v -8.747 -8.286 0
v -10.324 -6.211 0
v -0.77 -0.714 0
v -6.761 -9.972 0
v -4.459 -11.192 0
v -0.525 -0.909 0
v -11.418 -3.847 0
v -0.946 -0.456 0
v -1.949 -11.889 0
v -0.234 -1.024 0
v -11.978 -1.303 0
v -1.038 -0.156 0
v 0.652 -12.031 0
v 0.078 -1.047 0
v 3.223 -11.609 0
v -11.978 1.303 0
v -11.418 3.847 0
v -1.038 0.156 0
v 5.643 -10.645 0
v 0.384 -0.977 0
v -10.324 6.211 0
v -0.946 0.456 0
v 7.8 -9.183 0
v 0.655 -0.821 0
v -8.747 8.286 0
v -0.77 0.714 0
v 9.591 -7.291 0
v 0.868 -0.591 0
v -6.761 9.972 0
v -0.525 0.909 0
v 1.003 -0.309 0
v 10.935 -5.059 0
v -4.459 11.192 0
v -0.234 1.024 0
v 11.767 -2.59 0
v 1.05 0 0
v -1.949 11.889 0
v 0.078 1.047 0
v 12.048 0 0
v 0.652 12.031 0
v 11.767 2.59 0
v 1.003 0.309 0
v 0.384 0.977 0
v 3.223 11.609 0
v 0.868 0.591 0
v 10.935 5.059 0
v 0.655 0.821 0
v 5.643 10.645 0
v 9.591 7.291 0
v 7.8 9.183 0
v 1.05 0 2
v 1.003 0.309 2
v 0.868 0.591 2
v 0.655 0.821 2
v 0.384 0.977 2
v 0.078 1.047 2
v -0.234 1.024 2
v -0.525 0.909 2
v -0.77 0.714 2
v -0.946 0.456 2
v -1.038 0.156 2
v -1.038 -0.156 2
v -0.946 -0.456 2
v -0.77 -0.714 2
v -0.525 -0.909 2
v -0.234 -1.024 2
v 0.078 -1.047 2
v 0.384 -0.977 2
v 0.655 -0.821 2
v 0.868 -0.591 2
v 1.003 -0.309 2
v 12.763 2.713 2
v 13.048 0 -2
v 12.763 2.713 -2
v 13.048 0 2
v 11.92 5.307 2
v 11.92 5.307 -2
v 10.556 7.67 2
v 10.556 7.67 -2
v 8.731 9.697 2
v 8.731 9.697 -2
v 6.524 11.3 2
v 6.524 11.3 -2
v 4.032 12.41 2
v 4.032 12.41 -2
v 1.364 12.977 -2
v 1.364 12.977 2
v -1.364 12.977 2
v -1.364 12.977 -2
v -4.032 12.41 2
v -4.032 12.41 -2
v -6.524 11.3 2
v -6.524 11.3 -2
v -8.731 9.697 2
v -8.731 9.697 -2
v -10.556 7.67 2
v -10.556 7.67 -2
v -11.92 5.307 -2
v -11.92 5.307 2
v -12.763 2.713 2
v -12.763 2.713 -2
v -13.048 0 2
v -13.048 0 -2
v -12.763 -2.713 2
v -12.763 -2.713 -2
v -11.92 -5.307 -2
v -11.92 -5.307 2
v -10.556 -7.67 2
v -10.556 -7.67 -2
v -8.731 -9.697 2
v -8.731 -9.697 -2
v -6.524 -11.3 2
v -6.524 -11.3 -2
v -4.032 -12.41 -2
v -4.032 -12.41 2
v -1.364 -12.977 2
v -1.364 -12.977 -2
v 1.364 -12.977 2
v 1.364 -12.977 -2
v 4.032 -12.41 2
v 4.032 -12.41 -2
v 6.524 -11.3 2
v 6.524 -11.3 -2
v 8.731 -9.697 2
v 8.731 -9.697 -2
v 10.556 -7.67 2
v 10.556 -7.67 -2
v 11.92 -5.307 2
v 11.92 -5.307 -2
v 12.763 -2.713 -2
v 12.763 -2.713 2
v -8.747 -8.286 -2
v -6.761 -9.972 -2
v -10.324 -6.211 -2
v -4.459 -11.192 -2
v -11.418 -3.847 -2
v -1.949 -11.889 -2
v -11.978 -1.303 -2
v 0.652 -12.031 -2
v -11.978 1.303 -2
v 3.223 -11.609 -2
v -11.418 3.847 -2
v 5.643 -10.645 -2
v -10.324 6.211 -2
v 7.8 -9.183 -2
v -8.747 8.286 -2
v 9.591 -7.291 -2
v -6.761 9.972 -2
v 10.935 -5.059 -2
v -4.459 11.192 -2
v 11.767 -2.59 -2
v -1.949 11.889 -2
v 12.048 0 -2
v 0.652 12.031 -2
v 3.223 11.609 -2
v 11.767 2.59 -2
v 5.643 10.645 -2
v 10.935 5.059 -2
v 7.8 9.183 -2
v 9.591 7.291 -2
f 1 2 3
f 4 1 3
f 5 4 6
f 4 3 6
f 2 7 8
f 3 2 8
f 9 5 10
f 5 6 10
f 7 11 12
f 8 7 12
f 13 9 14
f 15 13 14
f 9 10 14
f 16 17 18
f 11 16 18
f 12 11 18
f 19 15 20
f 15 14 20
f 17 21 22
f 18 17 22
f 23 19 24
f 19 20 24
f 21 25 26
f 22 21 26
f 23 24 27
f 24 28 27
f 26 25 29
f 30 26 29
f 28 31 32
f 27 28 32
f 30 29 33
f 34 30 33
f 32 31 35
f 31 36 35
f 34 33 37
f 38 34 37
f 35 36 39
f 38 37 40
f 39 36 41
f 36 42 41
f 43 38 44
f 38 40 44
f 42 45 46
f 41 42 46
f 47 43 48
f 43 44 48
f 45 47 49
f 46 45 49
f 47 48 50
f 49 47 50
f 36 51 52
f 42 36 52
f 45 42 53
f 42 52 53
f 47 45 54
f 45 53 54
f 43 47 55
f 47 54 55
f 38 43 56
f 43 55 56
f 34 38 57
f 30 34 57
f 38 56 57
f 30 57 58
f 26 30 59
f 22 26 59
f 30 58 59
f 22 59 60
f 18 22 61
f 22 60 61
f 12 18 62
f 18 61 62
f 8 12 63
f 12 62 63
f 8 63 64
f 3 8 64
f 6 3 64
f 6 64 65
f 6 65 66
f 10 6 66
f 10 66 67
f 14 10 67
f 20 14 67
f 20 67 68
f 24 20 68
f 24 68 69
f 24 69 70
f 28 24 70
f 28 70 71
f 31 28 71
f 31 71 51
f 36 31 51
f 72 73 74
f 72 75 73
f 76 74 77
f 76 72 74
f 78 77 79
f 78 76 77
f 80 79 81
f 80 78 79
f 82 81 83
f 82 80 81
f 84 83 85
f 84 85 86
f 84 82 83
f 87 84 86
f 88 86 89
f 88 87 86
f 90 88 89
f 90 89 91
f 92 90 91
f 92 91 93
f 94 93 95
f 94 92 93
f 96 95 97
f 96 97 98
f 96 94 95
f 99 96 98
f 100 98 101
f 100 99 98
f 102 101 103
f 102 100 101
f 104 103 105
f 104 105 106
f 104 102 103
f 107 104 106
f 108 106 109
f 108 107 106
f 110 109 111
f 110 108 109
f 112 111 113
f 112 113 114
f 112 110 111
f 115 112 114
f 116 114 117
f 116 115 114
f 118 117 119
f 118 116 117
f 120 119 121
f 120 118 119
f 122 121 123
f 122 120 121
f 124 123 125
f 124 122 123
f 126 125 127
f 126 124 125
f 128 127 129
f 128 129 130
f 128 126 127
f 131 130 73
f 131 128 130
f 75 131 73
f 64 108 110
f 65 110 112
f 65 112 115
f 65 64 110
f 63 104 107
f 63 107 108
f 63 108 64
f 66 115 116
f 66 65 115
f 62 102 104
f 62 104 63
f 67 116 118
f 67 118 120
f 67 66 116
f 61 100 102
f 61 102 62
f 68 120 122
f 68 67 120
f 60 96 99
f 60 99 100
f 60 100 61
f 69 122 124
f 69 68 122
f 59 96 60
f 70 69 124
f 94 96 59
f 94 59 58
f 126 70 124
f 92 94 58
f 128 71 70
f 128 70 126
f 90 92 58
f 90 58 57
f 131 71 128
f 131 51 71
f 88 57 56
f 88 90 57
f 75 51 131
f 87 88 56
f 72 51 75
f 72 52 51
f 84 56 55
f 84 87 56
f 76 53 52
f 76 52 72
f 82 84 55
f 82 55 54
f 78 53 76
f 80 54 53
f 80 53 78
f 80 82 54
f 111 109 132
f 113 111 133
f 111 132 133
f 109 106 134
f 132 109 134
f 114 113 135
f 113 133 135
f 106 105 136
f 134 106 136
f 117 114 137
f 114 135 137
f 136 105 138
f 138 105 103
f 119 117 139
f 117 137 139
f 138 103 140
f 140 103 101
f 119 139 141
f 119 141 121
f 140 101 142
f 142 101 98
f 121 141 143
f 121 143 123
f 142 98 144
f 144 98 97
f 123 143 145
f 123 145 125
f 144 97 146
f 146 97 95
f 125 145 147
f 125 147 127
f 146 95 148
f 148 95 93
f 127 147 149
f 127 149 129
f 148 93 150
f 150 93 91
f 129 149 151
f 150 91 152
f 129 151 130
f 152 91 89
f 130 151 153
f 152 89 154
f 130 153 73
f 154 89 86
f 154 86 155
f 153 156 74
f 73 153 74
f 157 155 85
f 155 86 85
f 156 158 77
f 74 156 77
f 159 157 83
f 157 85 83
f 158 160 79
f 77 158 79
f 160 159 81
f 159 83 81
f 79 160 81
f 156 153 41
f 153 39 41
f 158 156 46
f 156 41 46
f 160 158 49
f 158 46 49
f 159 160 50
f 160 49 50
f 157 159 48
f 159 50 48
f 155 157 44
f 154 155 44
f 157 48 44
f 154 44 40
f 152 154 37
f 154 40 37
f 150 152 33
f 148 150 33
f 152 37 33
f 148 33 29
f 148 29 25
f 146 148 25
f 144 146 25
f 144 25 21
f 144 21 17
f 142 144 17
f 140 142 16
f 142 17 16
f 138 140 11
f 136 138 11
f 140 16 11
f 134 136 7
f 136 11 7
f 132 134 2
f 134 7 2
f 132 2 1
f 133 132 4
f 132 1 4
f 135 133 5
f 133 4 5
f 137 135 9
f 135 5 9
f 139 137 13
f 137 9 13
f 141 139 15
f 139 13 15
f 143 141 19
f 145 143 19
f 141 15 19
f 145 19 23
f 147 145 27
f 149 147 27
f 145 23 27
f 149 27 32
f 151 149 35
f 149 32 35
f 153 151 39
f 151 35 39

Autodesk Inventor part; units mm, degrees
ref_plane "YZ Plane" through (0, 0, 0) normal (1, 0, 0) x (0, 1, 0)
ref_plane "XZ Plane" through (0, 0, 0) normal (0, 1, 0) x (-1, 0, 0)
ref_plane "XY Plane" through (0, 0, 0) normal (0, 0, 1) x (1, 0, 0)
sketch "Sketch1" plane through (0, 0, 0) normal (0, 0, 1) x (1, 0, 0)
  circle A0 centre (0, 0) radius 13.0482
  spline S0 degree 3 poles (1.4215, 11.0572) (1.4473, 10.9809) (1.4859, 10.8664) (1.5292, 10.7112) (1.5586, 10.5939) (1.5843, 10.4759) (1.6059, 10.357) (1.6236, 10.2374) (1.631, 10.1572) (1.6346, 10.117) knots -0.096663 -0.096663 -0.096663 -0.096663 -0.072499 -0.060415 -0.048332 -0.036249 -0.024166 -0.012083 0 0 0 0 projected
  arc A1 (1.9905, 10.0531) -> (1.6346, 10.117) centre (0, 0) ccw projected
  spline S1 degree 3 poles (1.9905, 10.0531) (2.0079, 10.0894) (2.0426, 10.1621) (2.1009, 10.268) (2.1626, 10.3719) (2.2278, 10.4737) (2.2962, 10.5733) (2.3908, 10.7038) (2.4669, 10.7977) (2.5176, 10.8602) knots -0.096663 -0.096663 -0.096663 -0.096663 -0.084581 -0.072498 -0.060415 -0.048331 -0.036248 -0.024165 0 0 0 0 projected
  arc A2 (2.7193, 10.8115) -> (2.5176, 10.8602) centre (0, 0) ccw projected
  spline S2 degree 3 poles (2.7193, 10.8115) (2.7359, 10.7327) (2.7607, 10.6144) (2.7853, 10.4551) (2.8006, 10.3353) (2.8122, 10.215) (2.8196, 10.0943) (2.8231, 9.9735) (2.8208, 9.893) (2.8197, 9.8527) knots -0.096663 -0.096663 -0.096663 -0.096663 -0.072499 -0.060415 -0.048332 -0.036249 -0.024166 -0.012083 0 0 0 0 projected
  arc A3 (3.1655, 9.7471) -> (2.8197, 9.8527) centre (0, 0) ccw projected
  spline S3 degree 3 poles (3.1655, 9.7471) (3.1871, 9.7811) (3.2302, 9.8492) (3.3006, 9.9475) (3.3741, 10.0433) (3.4509, 10.1367) (3.5306, 10.2275) (3.64, 10.3459) (3.7266, 10.4301) (3.7844, 10.4863) knots -0.096663 -0.096663 -0.096663 -0.096663 -0.084581 -0.072498 -0.060415 -0.048331 -0.036248 -0.024165 0 0 0 0 projected
  arc A4 (3.9789, 10.414) -> (3.7844, 10.4863) centre (0, 0) ccw projected
  spline S4 degree 3 poles (3.9789, 10.414) (3.986, 10.3337) (3.9967, 10.2134) (4.0023, 10.0523) (4.0033, 9.9315) (4.0006, 9.8106) (3.9937, 9.69) (3.9828, 9.5696) (3.9711, 9.4899) (3.9652, 9.45) knots -0.096663 -0.096663 -0.096663 -0.096663 -0.072499 -0.060415 -0.048332 -0.036249 -0.024166 -0.012083 0 0 0 0 projected
  arc A5 (4.2961, 9.3043) -> (3.9652, 9.45) centre (0, 0) ccw projected
  spline S5 degree 3 poles (4.2961, 9.3043) (4.3215, 9.3355) (4.3724, 9.398) (4.4539, 9.4873) (4.5383, 9.5738) (4.6256, 9.6574) (4.7154, 9.7382) (4.838, 9.8428) (4.9341, 9.9161) (4.9981, 9.9651) knots -0.096663 -0.096663 -0.096663 -0.096663 -0.084581 -0.072498 -0.060415 -0.048331 -0.036248 -0.024165 0 0 0 0 projected
  arc A6 (5.1827, 9.8703) -> (4.9981, 9.9651) centre (0, 0) ccw projected
  spline S6 degree 3 poles (5.1827, 9.8703) (5.1803, 9.7898) (5.1766, 9.669) (5.1631, 9.5084) (5.1498, 9.3883) (5.1328, 9.2686) (5.1117, 9.1496) (5.0867, 9.0314) (5.0656, 8.9536) (5.0551, 8.9147) knots -0.096663 -0.096663 -0.096663 -0.096663 -0.072499 -0.060415 -0.048332 -0.036249 -0.024166 -0.012083 0 0 0 0 projected
  arc A7 (5.3664, 8.7309) -> (5.0551, 8.9147) centre (0, 0) ccw projected
  spline S7 degree 3 poles (5.3664, 8.7309) (5.3954, 8.7589) (5.4533, 8.8149) (5.5447, 8.8939) (5.6388, 8.9698) (5.7353, 9.0425) (5.8341, 9.1121) (5.9682, 9.2015) (6.0723, 9.263) (6.1416, 9.304) knots -0.096663 -0.096663 -0.096663 -0.096663 -0.084581 -0.072498 -0.060415 -0.048331 -0.036248 -0.024165 0 0 0 0 projected
  arc A8 (6.3137, 9.1881) -> (6.1416, 9.304) centre (0, 0) ccw projected
  spline S8 degree 3 poles (6.3137, 9.1881) (6.3018, 9.1084) (6.2839, 8.9889) (6.2515, 8.831) (6.2241, 8.7133) (6.193, 8.5965) (6.158, 8.4808) (6.1192, 8.3664) (6.089, 8.2916) (6.074, 8.2543) knots -0.096663 -0.096663 -0.096663 -0.096663 -0.072499 -0.060415 -0.048332 -0.036249 -0.024166 -0.012083 0 0 0 0 projected
  arc A9 (6.3614, 8.0349) -> (6.074, 8.2543) centre (0, 0) ccw projected
  spline S9 degree 3 poles (6.3614, 8.0349) (6.3934, 8.0593) (6.4576, 8.108) (6.5577, 8.1757) (6.6601, 8.24) (6.7646, 8.3007) (6.8709, 8.3581) (7.0146, 8.431) (7.1252, 8.4798) (7.1989, 8.5123) knots -0.096663 -0.096663 -0.096663 -0.096663 -0.084581 -0.072498 -0.060415 -0.048331 -0.036248 -0.024165 0 0 0 0 projected
  arc A10 (7.3561, 8.3768) -> (7.1989, 8.5123) centre (0, 0) ccw projected
  spline S10 degree 3 poles (7.3561, 8.3768) (7.3348, 8.2991) (7.3029, 8.1825) (7.2521, 8.0296) (7.2109, 7.916) (7.1663, 7.8037) (7.1179, 7.693) (7.0657, 7.5839) (7.027, 7.5133) (7.0076, 7.478) knots -0.096663 -0.096663 -0.096663 -0.096663 -0.072499 -0.060415 -0.048332 -0.036249 -0.024166 -0.012083 0 0 0 0 projected
  arc A11 (7.267, 7.2261) -> (7.0076, 7.478) centre (0, 0) ccw projected
  spline S11 degree 3 poles (7.267, 7.2261) (7.3017, 7.2465) (7.3712, 7.2874) (7.4787, 7.3427) (7.5879, 7.3944) (7.6988, 7.4424) (7.8112, 7.4868) (7.9625, 7.5422) (8.0781, 7.5775) (8.1552, 7.6011) knots -0.096663 -0.096663 -0.096663 -0.096663 -0.084581 -0.072498 -0.060415 -0.048331 -0.036248 -0.024165 0 0 0 0 projected
  arc A12 (8.2952, 7.448) -> (8.1552, 7.6011) centre (0, 0) ccw projected
  spline S12 degree 3 poles (8.2952, 7.448) (8.2649, 7.3734) (8.2194, 7.2614) (8.1509, 7.1155) (8.0966, 7.0076) (8.039, 6.9013) (7.9778, 6.7971) (7.9131, 6.695) (7.8663, 6.6294) (7.8429, 6.5967) knots -0.096663 -0.096663 -0.096663 -0.096663 -0.072499 -0.060415 -0.048332 -0.036249 -0.024166 -0.012083 0 0 0 0 projected
  arc A13 (8.0707, 6.3159) -> (7.8429, 6.5967) centre (0, 0) ccw projected
  spline S13 degree 3 poles (8.0707, 6.3159) (8.1076, 6.3321) (8.1814, 6.3644) (8.2946, 6.4066) (8.4092, 6.4451) (8.525, 6.4796) (8.6419, 6.5104) (8.7987, 6.5475) (8.9176, 6.5689) (8.9969, 6.5832) knots -0.096663 -0.096663 -0.096663 -0.096663 -0.084581 -0.072498 -0.060415 -0.048331 -0.036248 -0.024165 0 0 0 0 projected
  arc A14 (9.1179, 6.4146) -> (8.9969, 6.5832) centre (0, 0) ccw projected
  spline S14 degree 3 poles (9.1179, 6.4146) (9.079, 6.3441) (9.0206, 6.2383) (8.9352, 6.1016) (8.8686, 6.0008) (8.7988, 5.9021) (8.7257, 5.8059) (8.6494, 5.7121) (8.5952, 5.6525) (8.568, 5.6228) knots -0.096663 -0.096663 -0.096663 -0.096663 -0.072499 -0.060415 -0.048332 -0.036249 -0.024166 -0.012083 0 0 0 0 projected
  arc A15 (8.761, 5.317) -> (8.568, 5.6228) centre (0, 0) ccw projected
  spline S15 degree 3 poles (8.761, 5.317) (8.7996, 5.3287) (8.8767, 5.3521) (8.9941, 5.3806) (9.1125, 5.4052) (9.2316, 5.4258) (9.3512, 5.4426) (9.5113, 5.4609) (9.632, 5.4681) (9.7124, 5.4729) knots -0.096663 -0.096663 -0.096663 -0.096663 -0.084581 -0.072498 -0.060415 -0.048331 -0.036248 -0.024165 0 0 0 0 projected
  arc A16 (9.8126, 5.2912) -> (9.7124, 5.4729) centre (0, 0) ccw projected
  spline S16 degree 3 poles (9.8126, 5.2912) (9.7656, 5.2258) (9.6951, 5.1276) (9.5942, 5.002) (9.516, 4.9097) (9.4351, 4.82) (9.3511, 4.7331) (9.2643, 4.649) (9.2034, 4.5963) (9.1729, 4.5699) knots -0.096663 -0.096663 -0.096663 -0.096663 -0.072499 -0.060415 -0.048332 -0.036249 -0.024166 -0.012083 0 0 0 0 projected
  arc A17 (9.3284, 4.2435) -> (9.1729, 4.5699) centre (0, 0) ccw projected
  spline S17 degree 3 poles (9.3284, 4.2435) (9.3681, 4.2506) (9.4474, 4.2647) (9.5674, 4.2791) (9.6878, 4.2896) (9.8085, 4.2959) (9.9293, 4.2984) (10.0904, 4.2976) (10.2111, 4.2905) (10.2915, 4.2858) knots -0.096663 -0.096663 -0.096663 -0.096663 -0.084581 -0.072498 -0.060415 -0.048331 -0.036248 -0.024165 0 0 0 0 projected
  arc A18 (10.3695, 4.0935) -> (10.2915, 4.2858) centre (0, 0) ccw projected
  spline S18 degree 3 poles (10.3695, 4.0935) (10.3151, 4.0341) (10.2335, 3.9449) (10.1184, 3.8321) (10.0299, 3.7498) (9.939, 3.6703) (9.8453, 3.5939) (9.7491, 3.5206) (9.6824, 3.4755) (9.649, 3.4529) knots -0.096663 -0.096663 -0.096663 -0.096663 -0.072499 -0.060415 -0.048332 -0.036249 -0.024166 -0.012083 0 0 0 0 projected
  arc A19 (9.7648, 3.1104) -> (9.649, 3.4529) centre (0, 0) ccw projected
  spline S19 degree 3 poles (9.7648, 3.1104) (9.805, 3.1127) (9.8855, 3.1174) (10.0063, 3.1175) (10.1271, 3.1136) (10.2477, 3.1056) (10.368, 3.0939) (10.5279, 3.074) (10.6469, 3.0527) (10.7262, 3.0385) knots -0.096663 -0.096663 -0.096663 -0.096663 -0.084581 -0.072498 -0.060415 -0.048331 -0.036248 -0.024165 0 0 0 0 projected
  arc A20 (10.7809, 2.8383) -> (10.7262, 3.0385) centre (0, 0) ccw projected
  spline S20 degree 3 poles (10.7809, 2.8383) (10.7198, 2.7858) (10.6282, 2.7069) (10.5006, 2.6085) (10.403, 2.5372) (10.3033, 2.469) (10.2013, 2.4042) (10.0971, 2.3429) (10.0255, 2.306) (9.9897, 2.2875) knots -0.096663 -0.096663 -0.096663 -0.096663 -0.072499 -0.060415 -0.048332 -0.036249 -0.024166 -0.012083 0 0 0 0 projected
  arc A21 (10.0642, 1.9337) -> (9.9897, 2.2875) centre (0, 0) ccw projected
  spline S21 degree 3 poles (10.0642, 1.9337) (10.1044, 1.9312) (10.1848, 1.9263) (10.3048, 1.9121) (10.4243, 1.894) (10.5431, 1.8718) (10.6611, 1.8459) (10.8176, 1.8073) (10.9332, 1.772) (11.0103, 1.7485) knots -0.096663 -0.096663 -0.096663 -0.096663 -0.084581 -0.072498 -0.060415 -0.048331 -0.036248 -0.024165 0 0 0 0 projected
  arc A22 (11.0409, 1.5433) -> (11.0103, 1.7485) centre (0, 0) ccw projected
  spline S22 degree 3 poles (11.0409, 1.5433) (10.9741, 1.4983) (10.8738, 1.4309) (10.7354, 1.3482) (10.6301, 1.289) (10.523, 1.2331) (10.414, 1.1808) (10.3033, 1.1322) (10.2279, 1.104) (10.1901, 1.0899) knots -0.096663 -0.096663 -0.096663 -0.096663 -0.072499 -0.060415 -0.048332 -0.036249 -0.024166 -0.012083 0 0 0 0 projected
  arc A23 (10.2222, 0.7298) -> (10.1901, 1.0899) centre (0, 0) ccw projected
  spline S23 degree 3 poles (10.2222, 0.7298) (10.2619, 0.7226) (10.3411, 0.7082) (10.4587, 0.6799) (10.5752, 0.6478) (10.6905, 0.6117) (10.8046, 0.572) (10.9554, 0.5152) (11.066, 0.4665) (11.1398, 0.434) knots -0.096663 -0.096663 -0.096663 -0.096663 -0.084581 -0.072498 -0.060415 -0.048331 -0.036248 -0.024165 0 0 0 0 projected
  arc A24 (11.1459, 0.2266) -> (11.1398, 0.434) centre (0, 0) ccw projected
  spline S24 degree 3 poles (11.1459, 0.2266) (11.0742, 0.1899) (10.9667, 0.1348) (10.8196, 0.069) (10.708, 0.0227) (10.595, -0.0202) (10.4806, -0.0592) (10.3649, -0.0943) (10.2866, -0.1134) (10.2475, -0.1229) knots -0.096663 -0.096663 -0.096663 -0.096663 -0.072499 -0.060415 -0.048332 -0.036249 -0.024166 -0.012083 0 0 0 0 projected
  arc A25 (10.2368, -0.4843) -> (10.2475, -0.1229) centre (0, 0) ccw projected
  spline S25 degree 3 poles (10.2368, -0.4843) (10.2753, -0.4962) (10.3523, -0.5199) (10.4657, -0.5618) (10.5775, -0.6075) (10.6878, -0.657) (10.7965, -0.7099) (10.9394, -0.7842) (11.0435, -0.8456) (11.1129, -0.8865) knots -0.096663 -0.096663 -0.096663 -0.096663 -0.084581 -0.072498 -0.060415 -0.048331 -0.036248 -0.024165 0 0 0 0 projected
  arc A26 (11.0945, -1.0932) -> (11.1129, -0.8865) centre (0, 0) ccw projected
  spline S26 degree 3 poles (11.0945, -1.0932) (11.019, -1.1212) (10.9057, -1.1633) (10.7518, -1.2111) (10.6355, -1.2439) (10.5182, -1.2731) (10.4, -1.2983) (10.281, -1.3196) (10.201, -1.3292) (10.161, -1.3341) knots -0.096663 -0.096663 -0.096663 -0.096663 -0.072499 -0.060415 -0.048332 -0.036249 -0.024166 -0.012083 0 0 0 0 projected
  arc A27 (10.1077, -1.6917) -> (10.161, -1.3341) centre (0, 0) ccw projected
  spline S27 degree 3 poles (10.1077, -1.6917) (10.1445, -1.708) (10.2182, -1.7406) (10.3258, -1.7957) (10.4315, -1.8543) (10.5351, -1.9165) (10.6367, -1.9818) (10.7699, -2.0725) (10.866, -2.1458) (10.9301, -2.1947) knots -0.096663 -0.096663 -0.096663 -0.096663 -0.084581 -0.072498 -0.060415 -0.048331 -0.036248 -0.024165 0 0 0 0 projected
  arc A28 (10.8873, -2.3977) -> (10.9301, -2.1947) centre (0, 0) ccw projected
  spline S28 degree 3 poles (10.8873, -2.3977) (10.809, -2.4166) (10.6915, -2.4449) (10.5331, -2.4742) (10.4137, -2.4931) (10.2938, -2.5082) (10.1735, -2.5192) (10.0528, -2.5263) (9.9722, -2.5264) (9.9319, -2.5265) knots -0.096663 -0.096663 -0.096663 -0.096663 -0.072499 -0.060415 -0.048332 -0.036249 -0.024166 -0.012083 0 0 0 0 projected
  arc A29 (9.8366, -2.8753) -> (9.9319, -2.5265) centre (0, 0) ccw projected
  spline S29 degree 3 poles (9.8366, -2.8753) (9.8713, -2.8958) (9.9406, -2.9369) (10.0409, -3.0043) (10.1389, -3.075) (10.2345, -3.149) (10.3277, -3.226) (10.4492, -3.3318) (10.536, -3.4159) (10.5938, -3.472) knots -0.096663 -0.096663 -0.096663 -0.096663 -0.084581 -0.072498 -0.060415 -0.048331 -0.036248 -0.024165 0 0 0 0 projected
  arc A30 (10.5273, -3.6686) -> (10.5938, -3.472) centre (0, 0) ccw projected
  spline S30 degree 3 poles (10.5273, -3.6686) (10.4473, -3.6781) (10.3273, -3.6923) (10.1665, -3.7027) (10.0457, -3.7073) (9.9249, -3.7081) (9.8041, -3.7048) (9.6834, -3.6975) (9.6034, -3.6881) (9.5634, -3.6834) knots -0.096663 -0.096663 -0.096663 -0.096663 -0.072499 -0.060415 -0.048332 -0.036249 -0.024166 -0.012083 0 0 0 0 projected
  arc A31 (9.4275, -4.0185) -> (9.5634, -3.6834) centre (0, 0) ccw projected
  spline S31 degree 3 poles (9.4275, -4.0185) (9.4595, -4.043) (9.5234, -4.092) (9.6151, -4.1708) (9.7041, -4.2526) (9.7902, -4.3374) (9.8736, -4.4248) (9.9818, -4.5442) (10.058, -4.6381) (10.1088, -4.7006) knots -0.096663 -0.096663 -0.096663 -0.096663 -0.084581 -0.072498 -0.060415 -0.048331 -0.036248 -0.024165 0 0 0 0 projected
  arc A32 (10.0196, -4.8879) -> (10.1088, -4.7006) centre (0, 0) ccw projected
  spline S32 degree 3 poles (10.0196, -4.8879) (9.939, -4.8879) (9.8181, -4.8878) (9.6572, -4.8791) (9.5368, -4.8694) (9.4167, -4.8559) (9.2971, -4.8384) (9.1781, -4.8168) (9.0998, -4.7981) (9.0606, -4.7887) knots -0.096663 -0.096663 -0.096663 -0.096663 -0.072499 -0.060415 -0.048332 -0.036249 -0.024166 -0.012083 0 0 0 0 projected
  arc A33 (8.8861, -5.1053) -> (9.0606, -4.7887) centre (0, 0) ccw projected
  spline S33 degree 3 poles (8.8861, -5.1053) (8.9149, -5.1334) (8.9726, -5.1897) (9.0543, -5.2788) (9.133, -5.3705) (9.2085, -5.4649) (9.281, -5.5615) (9.3743, -5.6929) (9.4388, -5.7951) (9.4819, -5.8632) knots -0.096663 -0.096663 -0.096663 -0.096663 -0.084581 -0.072498 -0.060415 -0.048331 -0.036248 -0.024165 0 0 0 0 projected
  arc A34 (9.3711, -6.0387) -> (9.4819, -5.8632) centre (0, 0) ccw projected
  spline S34 degree 3 poles (9.3711, -6.0387) (9.2911, -6.0291) (9.1711, -6.0147) (9.0124, -5.987) (8.8939, -5.9631) (8.7762, -5.9356) (8.6596, -5.904) (8.544, -5.8686) (8.4684, -5.8407) (8.4307, -5.8267) knots -0.096663 -0.096663 -0.096663 -0.096663 -0.072499 -0.060415 -0.048332 -0.036249 -0.024166 -0.012083 0 0 0 0 projected
  arc A35 (8.2199, -6.1205) -> (8.4307, -5.8267) centre (0, 0) ccw projected
  spline S35 degree 3 poles (8.2199, -6.1205) (8.2452, -6.1518) (8.2958, -6.2144) (8.3664, -6.3126) (8.4337, -6.413) (8.4975, -6.5156) (8.5581, -6.6202) (8.6352, -6.7617) (8.6872, -6.8708) (8.7219, -6.9435) knots -0.096663 -0.096663 -0.096663 -0.096663 -0.084581 -0.072498 -0.060415 -0.048331 -0.036248 -0.024165 0 0 0 0 projected
  arc A36 (8.5911, -7.1046) -> (8.7219, -6.9435) centre (0, 0) ccw projected
  spline S36 degree 3 poles (8.5911, -7.1046) (8.5128, -7.0857) (8.3954, -7.0572) (8.241, -7.0109) (8.1262, -6.9732) (8.0126, -6.9319) (7.9005, -6.8868) (7.79, -6.8379) (7.7182, -6.8013) (7.6823, -6.7829) knots -0.096663 -0.096663 -0.096663 -0.096663 -0.072499 -0.060415 -0.048332 -0.036249 -0.024166 -0.012083 0 0 0 0 projected
  arc A37 (7.4383, -7.0497) -> (7.6823, -6.7829) centre (0, 0) ccw projected
  spline S37 degree 3 poles (7.4383, -7.0497) (7.4597, -7.0838) (7.5026, -7.152) (7.5611, -7.2578) (7.616, -7.3654) (7.6672, -7.4749) (7.715, -7.5859) (7.7748, -7.7355) (7.8136, -7.85) (7.8394, -7.9263) knots -0.096663 -0.096663 -0.096663 -0.096663 -0.084581 -0.072498 -0.060415 -0.048331 -0.036248 -0.024165 0 0 0 0 projected
  arc A38 (7.6905, -8.0709) -> (7.8394, -7.9263) centre (0, 0) ccw projected
  spline S38 degree 3 poles (7.6905, -8.0709) (7.615, -8.0428) (7.5018, -8.0006) (7.354, -7.9364) (7.2444, -7.8854) (7.1365, -7.8309) (7.0306, -7.7728) (6.9265, -7.7113) (6.8596, -7.6664) (6.8262, -7.6439) knots -0.096663 -0.096663 -0.096663 -0.096663 -0.072499 -0.060415 -0.048332 -0.036249 -0.024166 -0.012083 0 0 0 0 projected
  arc A39 (6.5523, -7.88) -> (6.8262, -7.6439) centre (0, 0) ccw projected
  spline S39 degree 3 poles (6.5523, -7.88) (6.5696, -7.9164) (6.6041, -7.9892) (6.6496, -8.1011) (6.6914, -8.2145) (6.7293, -8.3293) (6.7637, -8.4451) (6.8053, -8.6008) (6.8303, -8.7191) (6.8469, -8.7979) knots -0.096663 -0.096663 -0.096663 -0.096663 -0.084581 -0.072498 -0.060415 -0.048331 -0.036248 -0.024165 0 0 0 0 projected
  arc A40 (6.682, -8.9238) -> (6.8469, -8.7979) centre (0, 0) ccw projected
  spline S40 degree 3 poles (6.682, -8.9238) (6.6103, -8.887) (6.5028, -8.8317) (6.3637, -8.7505) (6.261, -8.6868) (6.1602, -8.62) (6.0619, -8.5498) (5.9659, -8.4764) (5.9048, -8.4239) (5.8742, -8.3976) knots -0.096663 -0.096663 -0.096663 -0.096663 -0.072499 -0.060415 -0.048332 -0.036249 -0.024166 -0.012083 0 0 0 0 projected
  arc A41 (5.5743, -8.5996) -> (5.8742, -8.3976) centre (0, 0) ccw projected
  spline S41 degree 3 poles (5.5743, -8.5996) (5.5871, -8.6378) (5.6128, -8.7142) (5.6448, -8.8307) (5.6729, -8.9483) (5.697, -9.0667) (5.7173, -9.1858) (5.7403, -9.3453) (5.7511, -9.4657) (5.7583, -9.5459) knots -0.096663 -0.096663 -0.096663 -0.096663 -0.084581 -0.072498 -0.060415 -0.048331 -0.036248 -0.024165 0 0 0 0 projected
  arc A42 (5.5797, -9.6515) -> (5.7583, -9.5459) centre (0, 0) ccw projected
  spline S42 degree 3 poles (5.5797, -9.6515) (5.5128, -9.6064) (5.4126, -9.5389) (5.2841, -9.4417) (5.1896, -9.3664) (5.0975, -9.2881) (5.0081, -9.2068) (4.9215, -9.1225) (4.867, -9.0631) (4.8397, -9.0335) knots -0.096663 -0.096663 -0.096663 -0.096663 -0.072499 -0.060415 -0.048332 -0.036249 -0.024166 -0.012083 0 0 0 0 projected
  arc A43 (4.5181, -9.1985) -> (4.8397, -9.0335) centre (0, 0) ccw projected
  spline S43 degree 3 poles (4.5181, -9.1985) (4.5263, -9.238) (4.5428, -9.3169) (4.5607, -9.4364) (4.5747, -9.5564) (4.5846, -9.6769) (4.5908, -9.7976) (4.5947, -9.9587) (4.5912, -10.0795) (4.5889, -10.16) knots -0.096663 -0.096663 -0.096663 -0.096663 -0.084581 -0.072498 -0.060415 -0.048331 -0.036248 -0.024165 0 0 0 0 projected
  arc A44 (4.399, -10.2436) -> (4.5889, -10.16) centre (0, 0) ccw projected
  spline S44 degree 3 poles (4.399, -10.2436) (4.338, -10.191) (4.2465, -10.1121) (4.1303, -10.0004) (4.0454, -9.9144) (3.9632, -9.8258) (3.8841, -9.7345) (3.808, -9.6405) (3.7609, -9.5751) (3.7374, -9.5425) knots -0.096663 -0.096663 -0.096663 -0.096663 -0.072499 -0.060415 -0.048332 -0.036249 -0.024166 -0.012083 0 0 0 0 projected
  arc A45 (3.3984, -9.6684) -> (3.7374, -9.5425) centre (0, 0) ccw projected
  spline S45 degree 3 poles (3.3984, -9.6684) (3.4019, -9.7085) (3.4089, -9.7887) (3.4127, -9.9096) (3.4124, -10.0304) (3.4079, -10.1512) (3.3998, -10.2718) (3.3846, -10.4322) (3.3669, -10.5517) (3.355, -10.6314) knots -0.096663 -0.096663 -0.096663 -0.096663 -0.084581 -0.072498 -0.060415 -0.048331 -0.036248 -0.024165 0 0 0 0 projected
  arc A46 (3.1566, -10.692) -> (3.355, -10.6314) centre (0, 0) ccw projected
  spline S46 degree 3 poles (3.1566, -10.692) (3.1022, -10.6326) (3.0207, -10.5433) (2.9185, -10.4187) (2.8444, -10.3233) (2.7732, -10.2256) (2.7055, -10.1255) (2.6411, -10.0232) (2.602, -9.9528) (2.5825, -9.9175) knots -0.096663 -0.096663 -0.096663 -0.096663 -0.072499 -0.060415 -0.048332 -0.036249 -0.024166 -0.012083 0 0 0 0 projected
  arc A47 (2.2311, -10.0024) -> (2.5825, -9.9175) centre (0, 0) ccw projected
  spline S47 degree 3 poles (2.2311, -10.0024) (2.2298, -10.0427) (2.2273, -10.1232) (2.2167, -10.2436) (2.2021, -10.3636) (2.1834, -10.483) (2.161, -10.6018) (2.127, -10.7593) (2.0952, -10.8759) (2.074, -10.9536) knots -0.096663 -0.096663 -0.096663 -0.096663 -0.084581 -0.072498 -0.060415 -0.048331 -0.036248 -0.024165 0 0 0 0 projected
  arc A48 (1.8698, -10.9903) -> (2.074, -10.9536) centre (0, 0) ccw projected
  spline S48 degree 3 poles (1.8698, -10.9903) (1.8229, -10.9248) (1.7525, -10.8266) (1.6658, -10.6908) (1.6034, -10.5872) (1.5443, -10.4818) (1.4889, -10.3744) (1.437, -10.2652) (1.4066, -10.1906) (1.3914, -10.1533) knots -0.096663 -0.096663 -0.096663 -0.096663 -0.072499 -0.060415 -0.048332 -0.036249 -0.024166 -0.012083 0 0 0 0 projected
  arc A49 (1.0324, -10.1961) -> (1.3914, -10.1533) centre (0, 0) ccw projected
  spline S49 degree 3 poles (1.0324, -10.1961) (1.0264, -10.2359) (1.0143, -10.3156) (0.9896, -10.4339) (0.9609, -10.5513) (0.9282, -10.6677) (0.892, -10.7829) (0.8396, -10.9353) (0.7942, -11.0474) (0.764, -11.122) knots -0.096663 -0.096663 -0.096663 -0.096663 -0.084581 -0.072498 -0.060415 -0.048331 -0.036248 -0.024165 0 0 0 0 projected
  arc A50 (0.5568, -11.1343) -> (0.764, -11.122) centre (0, 0) ccw projected
  spline S50 degree 3 poles (0.5568, -11.1343) (0.518, -11.0637) (0.4597, -10.9579) (0.3896, -10.8128) (0.34, -10.7026) (0.2938, -10.5909) (0.2514, -10.4777) (0.2129, -10.3632) (0.1915, -10.2855) (0.1808, -10.2466) knots -0.096663 -0.096663 -0.096663 -0.096663 -0.072499 -0.060415 -0.048332 -0.036249 -0.024166 -0.012083 0 0 0 0 projected
  arc A51 (-0.1808, -10.2466) -> (0.1808, -10.2466) centre (0, 0) ccw projected
  spline S51 degree 3 poles (-0.1808, -10.2466) (-0.1915, -10.2855) (-0.2129, -10.3632) (-0.2514, -10.4777) (-0.2938, -10.5909) (-0.34, -10.7026) (-0.3896, -10.8128) (-0.4597, -10.9579) (-0.518, -11.0637) (-0.5568, -11.1343) knots -0.096663 -0.096663 -0.096663 -0.096663 -0.084581 -0.072498 -0.060415 -0.048331 -0.036248 -0.024165 0 0 0 0 projected
  arc A52 (-0.764, -11.122) -> (-0.5568, -11.1343) centre (0, 0) ccw projected
  spline S52 degree 3 poles (-0.764, -11.122) (-0.7942, -11.0474) (-0.8396, -10.9353) (-0.892, -10.7829) (-0.9282, -10.6677) (-0.9609, -10.5513) (-0.9896, -10.4339) (-1.0143, -10.3156) (-1.0264, -10.2359) (-1.0324, -10.1961) knots -0.096663 -0.096663 -0.096663 -0.096663 -0.072499 -0.060415 -0.048332 -0.036249 -0.024166 -0.012083 0 0 0 0 projected
  arc A53 (-1.3914, -10.1533) -> (-1.0324, -10.1961) centre (0, 0) ccw projected
  spline S53 degree 3 poles (-1.3914, -10.1533) (-1.4066, -10.1906) (-1.437, -10.2652) (-1.4889, -10.3744) (-1.5443, -10.4818) (-1.6034, -10.5872) (-1.6658, -10.6908) (-1.7525, -10.8266) (-1.8229, -10.9248) (-1.8698, -10.9903) knots -0.096663 -0.096663 -0.096663 -0.096663 -0.084581 -0.072498 -0.060415 -0.048331 -0.036248 -0.024165 0 0 0 0 projected
  arc A54 (-2.074, -10.9536) -> (-1.8698, -10.9903) centre (0, 0) ccw projected
  spline S54 degree 3 poles (-2.074, -10.9536) (-2.0952, -10.8759) (-2.127, -10.7593) (-2.161, -10.6018) (-2.1834, -10.483) (-2.2021, -10.3636) (-2.2167, -10.2436) (-2.2273, -10.1232) (-2.2298, -10.0427) (-2.2311, -10.0024) knots -0.096663 -0.096663 -0.096663 -0.096663 -0.072499 -0.060415 -0.048332 -0.036249 -0.024166 -0.012083 0 0 0 0 projected
  arc A55 (-2.5825, -9.9175) -> (-2.2311, -10.0024) centre (0, 0) ccw projected
  spline S55 degree 3 poles (-2.5825, -9.9175) (-2.602, -9.9528) (-2.6411, -10.0232) (-2.7055, -10.1255) (-2.7732, -10.2256) (-2.8444, -10.3233) (-2.9185, -10.4187) (-3.0207, -10.5433) (-3.1022, -10.6326) (-3.1566, -10.692) knots -0.096663 -0.096663 -0.096663 -0.096663 -0.084581 -0.072498 -0.060415 -0.048331 -0.036248 -0.024165 0 0 0 0 projected
  arc A56 (-3.355, -10.6314) -> (-3.1566, -10.692) centre (0, 0) ccw projected
  spline S56 degree 3 poles (-3.355, -10.6314) (-3.3669, -10.5517) (-3.3846, -10.4322) (-3.3998, -10.2718) (-3.4079, -10.1512) (-3.4124, -10.0304) (-3.4127, -9.9096) (-3.4089, -9.7887) (-3.4019, -9.7085) (-3.3984, -9.6684) knots -0.096663 -0.096663 -0.096663 -0.096663 -0.072499 -0.060415 -0.048332 -0.036249 -0.024166 -0.012083 0 0 0 0 projected
  arc A57 (-3.7374, -9.5425) -> (-3.3984, -9.6684) centre (0, 0) ccw projected
  spline S57 degree 3 poles (-3.7374, -9.5425) (-3.7609, -9.5751) (-3.808, -9.6405) (-3.8841, -9.7345) (-3.9632, -9.8258) (-4.0454, -9.9144) (-4.1303, -10.0004) (-4.2465, -10.1121) (-4.338, -10.191) (-4.399, -10.2436) knots -0.096663 -0.096663 -0.096663 -0.096663 -0.084581 -0.072498 -0.060415 -0.048331 -0.036248 -0.024165 0 0 0 0 projected
  arc A58 (-4.5889, -10.16) -> (-4.399, -10.2436) centre (0, 0) ccw projected
  spline S58 degree 3 poles (-4.5889, -10.16) (-4.5912, -10.0795) (-4.5947, -9.9587) (-4.5908, -9.7976) (-4.5846, -9.6769) (-4.5747, -9.5564) (-4.5607, -9.4364) (-4.5428, -9.3169) (-4.5263, -9.238) (-4.5181, -9.1985) knots -0.096663 -0.096663 -0.096663 -0.096663 -0.072499 -0.060415 -0.048332 -0.036249 -0.024166 -0.012083 0 0 0 0 projected
  arc A59 (-4.8397, -9.0335) -> (-4.5181, -9.1985) centre (0, 0) ccw projected
  spline S59 degree 3 poles (-4.8397, -9.0335) (-4.867, -9.0631) (-4.9215, -9.1225) (-5.0081, -9.2068) (-5.0975, -9.2881) (-5.1896, -9.3664) (-5.2841, -9.4417) (-5.4126, -9.5389) (-5.5128, -9.6064) (-5.5797, -9.6515) knots -0.096663 -0.096663 -0.096663 -0.096663 -0.084581 -0.072498 -0.060415 -0.048331 -0.036248 -0.024165 0 0 0 0 projected
  arc A60 (-5.7583, -9.5459) -> (-5.5797, -9.6515) centre (0, 0) ccw projected
  spline S60 degree 3 poles (-5.7583, -9.5459) (-5.7511, -9.4657) (-5.7403, -9.3453) (-5.7173, -9.1858) (-5.697, -9.0667) (-5.6729, -8.9483) (-5.6448, -8.8307) (-5.6128, -8.7142) (-5.5871, -8.6378) (-5.5743, -8.5996) knots -0.096663 -0.096663 -0.096663 -0.096663 -0.072499 -0.060415 -0.048332 -0.036249 -0.024166 -0.012083 0 0 0 0 projected
  arc A61 (-5.8742, -8.3976) -> (-5.5743, -8.5996) centre (0, 0) ccw projected
  spline S61 degree 3 poles (-5.8742, -8.3976) (-5.9048, -8.4239) (-5.9659, -8.4764) (-6.0619, -8.5498) (-6.1602, -8.62) (-6.261, -8.6868) (-6.3637, -8.7505) (-6.5028, -8.8317) (-6.6103, -8.887) (-6.682, -8.9238) knots -0.096663 -0.096663 -0.096663 -0.096663 -0.084581 -0.072498 -0.060415 -0.048331 -0.036248 -0.024165 0 0 0 0 projected
  arc A62 (-6.8469, -8.7979) -> (-6.682, -8.9238) centre (0, 0) ccw projected
  spline S62 degree 3 poles (-6.8469, -8.7979) (-6.8303, -8.7191) (-6.8053, -8.6008) (-6.7637, -8.4451) (-6.7293, -8.3293) (-6.6914, -8.2145) (-6.6496, -8.1011) (-6.6041, -7.9892) (-6.5696, -7.9164) (-6.5523, -7.88) knots -0.096663 -0.096663 -0.096663 -0.096663 -0.072499 -0.060415 -0.048332 -0.036249 -0.024166 -0.012083 0 0 0 0 projected
  arc A63 (-6.8262, -7.6439) -> (-6.5523, -7.88) centre (0, 0) ccw projected
  spline S63 degree 3 poles (-6.8262, -7.6439) (-6.8596, -7.6664) (-6.9265, -7.7113) (-7.0306, -7.7728) (-7.1365, -7.8309) (-7.2444, -7.8854) (-7.354, -7.9364) (-7.5018, -8.0006) (-7.615, -8.0428) (-7.6905, -8.0709) knots -0.096663 -0.096663 -0.096663 -0.096663 -0.084581 -0.072498 -0.060415 -0.048331 -0.036248 -0.024165 0 0 0 0 projected
  arc A64 (-7.8394, -7.9263) -> (-7.6905, -8.0709) centre (0, 0) ccw projected
  spline S64 degree 3 poles (-7.8394, -7.9263) (-7.8136, -7.85) (-7.7748, -7.7355) (-7.715, -7.5859) (-7.6672, -7.4749) (-7.616, -7.3654) (-7.5611, -7.2578) (-7.5026, -7.152) (-7.4597, -7.0838) (-7.4383, -7.0497) knots -0.096663 -0.096663 -0.096663 -0.096663 -0.072499 -0.060415 -0.048332 -0.036249 -0.024166 -0.012083 0 0 0 0 projected
  arc A65 (-7.6823, -6.7829) -> (-7.4383, -7.0497) centre (0, 0) ccw projected
  spline S65 degree 3 poles (-7.6823, -6.7829) (-7.7182, -6.8013) (-7.79, -6.8379) (-7.9005, -6.8868) (-8.0126, -6.9319) (-8.1262, -6.9732) (-8.241, -7.0109) (-8.3954, -7.0572) (-8.5128, -7.0857) (-8.5911, -7.1046) knots -0.096663 -0.096663 -0.096663 -0.096663 -0.084581 -0.072498 -0.060415 -0.048331 -0.036248 -0.024165 0 0 0 0 projected
  arc A66 (-8.7219, -6.9435) -> (-8.5911, -7.1046) centre (0, 0) ccw projected
  spline S66 degree 3 poles (-8.7219, -6.9435) (-8.6872, -6.8708) (-8.6352, -6.7617) (-8.5581, -6.6202) (-8.4975, -6.5156) (-8.4337, -6.413) (-8.3664, -6.3126) (-8.2958, -6.2144) (-8.2452, -6.1518) (-8.2199, -6.1205) knots -0.096663 -0.096663 -0.096663 -0.096663 -0.072499 -0.060415 -0.048332 -0.036249 -0.024166 -0.012083 0 0 0 0 projected
  arc A67 (-8.4307, -5.8267) -> (-8.2199, -6.1205) centre (0, 0) ccw projected
  spline S67 degree 3 poles (-8.4307, -5.8267) (-8.4684, -5.8407) (-8.544, -5.8686) (-8.6596, -5.904) (-8.7762, -5.9356) (-8.8939, -5.9631) (-9.0124, -5.987) (-9.1711, -6.0147) (-9.2911, -6.0291) (-9.3711, -6.0387) knots -0.096663 -0.096663 -0.096663 -0.096663 -0.084581 -0.072498 -0.060415 -0.048331 -0.036248 -0.024165 0 0 0 0 projected
  arc A68 (-9.4819, -5.8632) -> (-9.3711, -6.0387) centre (0, 0) ccw projected
  spline S68 degree 3 poles (-9.4819, -5.8632) (-9.4388, -5.7951) (-9.3743, -5.6929) (-9.281, -5.5615) (-9.2085, -5.4649) (-9.133, -5.3705) (-9.0543, -5.2788) (-8.9726, -5.1897) (-8.9149, -5.1334) (-8.8861, -5.1053) knots -0.096663 -0.096663 -0.096663 -0.096663 -0.072499 -0.060415 -0.048332 -0.036249 -0.024166 -0.012083 0 0 0 0 projected
  arc A69 (-9.0606, -4.7887) -> (-8.8861, -5.1053) centre (0, 0) ccw projected
  spline S69 degree 3 poles (-9.0606, -4.7887) (-9.0998, -4.7981) (-9.1781, -4.8168) (-9.2971, -4.8384) (-9.4167, -4.8559) (-9.5368, -4.8694) (-9.6572, -4.8791) (-9.8181, -4.8878) (-9.939, -4.8879) (-10.0196, -4.8879) knots -0.096663 -0.096663 -0.096663 -0.096663 -0.084581 -0.072498 -0.060415 -0.048331 -0.036248 -0.024165 0 0 0 0 projected
  arc A70 (-10.1088, -4.7006) -> (-10.0196, -4.8879) centre (0, 0) ccw projected
  spline S70 degree 3 poles (-10.1088, -4.7006) (-10.058, -4.6381) (-9.9818, -4.5442) (-9.8736, -4.4248) (-9.7902, -4.3374) (-9.7041, -4.2526) (-9.6151, -4.1708) (-9.5234, -4.092) (-9.4595, -4.043) (-9.4275, -4.0185) knots -0.096663 -0.096663 -0.096663 -0.096663 -0.072499 -0.060415 -0.048332 -0.036249 -0.024166 -0.012083 0 0 0 0 projected
  arc A71 (-9.5634, -3.6834) -> (-9.4275, -4.0185) centre (0, 0) ccw projected
  spline S71 degree 3 poles (-9.5634, -3.6834) (-9.6034, -3.6881) (-9.6834, -3.6975) (-9.8041, -3.7048) (-9.9249, -3.7081) (-10.0457, -3.7073) (-10.1665, -3.7027) (-10.3273, -3.6923) (-10.4473, -3.6781) (-10.5273, -3.6686) knots -0.096663 -0.096663 -0.096663 -0.096663 -0.084581 -0.072498 -0.060415 -0.048331 -0.036248 -0.024165 0 0 0 0 projected
  arc A72 (-10.5938, -3.472) -> (-10.5273, -3.6686) centre (0, 0) ccw projected
  spline S72 degree 3 poles (-10.5938, -3.472) (-10.536, -3.4159) (-10.4492, -3.3318) (-10.3277, -3.226) (-10.2345, -3.149) (-10.1389, -3.075) (-10.0409, -3.0043) (-9.9406, -2.9369) (-9.8713, -2.8958) (-9.8366, -2.8753) knots -0.096663 -0.096663 -0.096663 -0.096663 -0.072499 -0.060415 -0.048332 -0.036249 -0.024166 -0.012083 0 0 0 0 projected
  arc A73 (-9.9319, -2.5265) -> (-9.8366, -2.8753) centre (0, 0) ccw projected
  spline S73 degree 3 poles (-9.9319, -2.5265) (-9.9722, -2.5264) (-10.0528, -2.5263) (-10.1735, -2.5192) (-10.2938, -2.5082) (-10.4137, -2.4931) (-10.5331, -2.4742) (-10.6915, -2.4449) (-10.809, -2.4166) (-10.8873, -2.3977) knots -0.096663 -0.096663 -0.096663 -0.096663 -0.084581 -0.072498 -0.060415 -0.048331 -0.036248 -0.024165 0 0 0 0 projected
  arc A74 (-10.9301, -2.1947) -> (-10.8873, -2.3977) centre (0, 0) ccw projected
  spline S74 degree 3 poles (-10.9301, -2.1947) (-10.866, -2.1458) (-10.7699, -2.0725) (-10.6367, -1.9818) (-10.5351, -1.9165) (-10.4315, -1.8543) (-10.3258, -1.7957) (-10.2182, -1.7406) (-10.1445, -1.708) (-10.1077, -1.6917) knots -0.096663 -0.096663 -0.096663 -0.096663 -0.072499 -0.060415 -0.048332 -0.036249 -0.024166 -0.012083 0 0 0 0 projected
  arc A75 (-10.161, -1.3341) -> (-10.1077, -1.6917) centre (0, 0) ccw projected
  spline S75 degree 3 poles (-10.161, -1.3341) (-10.201, -1.3292) (-10.281, -1.3196) (-10.4, -1.2983) (-10.5182, -1.2731) (-10.6355, -1.2439) (-10.7518, -1.2111) (-10.9057, -1.1633) (-11.019, -1.1212) (-11.0945, -1.0932) knots -0.096663 -0.096663 -0.096663 -0.096663 -0.084581 -0.072498 -0.060415 -0.048331 -0.036248 -0.024165 0 0 0 0 projected
  arc A76 (-11.1129, -0.8865) -> (-11.0945, -1.0932) centre (0, 0) ccw projected
  spline S76 degree 3 poles (-11.1129, -0.8865) (-11.0435, -0.8456) (-10.9394, -0.7842) (-10.7965, -0.7099) (-10.6878, -0.657) (-10.5775, -0.6075) (-10.4657, -0.5618) (-10.3523, -0.5199) (-10.2753, -0.4962) (-10.2368, -0.4843) knots -0.096663 -0.096663 -0.096663 -0.096663 -0.072499 -0.060415 -0.048332 -0.036249 -0.024166 -0.012083 0 0 0 0 projected
  arc A77 (-10.2475, -0.1229) -> (-10.2368, -0.4843) centre (0, 0) ccw projected
  spline S77 degree 3 poles (-10.2475, -0.1229) (-10.2866, -0.1134) (-10.3649, -0.0943) (-10.4806, -0.0592) (-10.595, -0.0202) (-10.708, 0.0227) (-10.8196, 0.069) (-10.9667, 0.1348) (-11.0742, 0.1899) (-11.1459, 0.2266) knots -0.096663 -0.096663 -0.096663 -0.096663 -0.084581 -0.072498 -0.060415 -0.048331 -0.036248 -0.024165 0 0 0 0 projected
  arc A78 (-11.1398, 0.434) -> (-11.1459, 0.2266) centre (0, 0) ccw projected
  spline S78 degree 3 poles (-11.1398, 0.434) (-11.066, 0.4665) (-10.9554, 0.5152) (-10.8046, 0.572) (-10.6905, 0.6117) (-10.5752, 0.6478) (-10.4587, 0.6799) (-10.3411, 0.7082) (-10.2619, 0.7226) (-10.2222, 0.7298) knots -0.096663 -0.096663 -0.096663 -0.096663 -0.072499 -0.060415 -0.048332 -0.036249 -0.024166 -0.012083 0 0 0 0 projected
  arc A79 (-10.1901, 1.0899) -> (-10.2222, 0.7298) centre (0, 0) ccw projected
  spline S79 degree 3 poles (-10.1901, 1.0899) (-10.2279, 1.104) (-10.3033, 1.1322) (-10.414, 1.1808) (-10.523, 1.2331) (-10.6301, 1.289) (-10.7354, 1.3482) (-10.8738, 1.4309) (-10.9741, 1.4983) (-11.0409, 1.5433) knots -0.096663 -0.096663 -0.096663 -0.096663 -0.084581 -0.072498 -0.060415 -0.048331 -0.036248 -0.024165 0 0 0 0 projected
  arc A80 (-11.0103, 1.7485) -> (-11.0409, 1.5433) centre (0, 0) ccw projected
  spline S80 degree 3 poles (-11.0103, 1.7485) (-10.9332, 1.772) (-10.8176, 1.8073) (-10.6611, 1.8459) (-10.5431, 1.8718) (-10.4243, 1.894) (-10.3048, 1.9121) (-10.1848, 1.9263) (-10.1044, 1.9312) (-10.0642, 1.9337) knots -0.096663 -0.096663 -0.096663 -0.096663 -0.072499 -0.060415 -0.048332 -0.036249 -0.024166 -0.012083 0 0 0 0 projected
  arc A81 (-9.9897, 2.2875) -> (-10.0642, 1.9337) centre (0, 0) ccw projected
  spline S81 degree 3 poles (-9.9897, 2.2875) (-10.0255, 2.306) (-10.0971, 2.3429) (-10.2013, 2.4042) (-10.3033, 2.469) (-10.403, 2.5372) (-10.5006, 2.6085) (-10.6282, 2.7069) (-10.7198, 2.7858) (-10.7809, 2.8383) knots -0.096663 -0.096663 -0.096663 -0.096663 -0.084581 -0.072498 -0.060415 -0.048331 -0.036248 -0.024165 0 0 0 0 projected
  arc A82 (-10.7262, 3.0385) -> (-10.7809, 2.8383) centre (0, 0) ccw projected
  spline S82 degree 3 poles (-10.7262, 3.0385) (-10.6469, 3.0527) (-10.5279, 3.074) (-10.368, 3.0939) (-10.2477, 3.1056) (-10.1271, 3.1136) (-10.0063, 3.1175) (-9.8855, 3.1174) (-9.805, 3.1127) (-9.7648, 3.1104) knots -0.096663 -0.096663 -0.096663 -0.096663 -0.072499 -0.060415 -0.048332 -0.036249 -0.024166 -0.012083 0 0 0 0 projected
  arc A83 (-9.649, 3.4529) -> (-9.7648, 3.1104) centre (0, 0) ccw projected
  spline S83 degree 3 poles (-9.649, 3.4529) (-9.6824, 3.4755) (-9.7491, 3.5206) (-9.8453, 3.5939) (-9.939, 3.6703) (-10.0299, 3.7498) (-10.1184, 3.8321) (-10.2335, 3.9449) (-10.3151, 4.0341) (-10.3695, 4.0935) knots -0.096663 -0.096663 -0.096663 -0.096663 -0.084581 -0.072498 -0.060415 -0.048331 -0.036248 -0.024165 0 0 0 0 projected
  arc A84 (-10.2915, 4.2858) -> (-10.3695, 4.0935) centre (0, 0) ccw projected
  spline S84 degree 3 poles (-10.2915, 4.2858) (-10.2111, 4.2905) (-10.0904, 4.2976) (-9.9293, 4.2984) (-9.8085, 4.2959) (-9.6878, 4.2896) (-9.5674, 4.2791) (-9.4474, 4.2647) (-9.3681, 4.2506) (-9.3284, 4.2435) knots -0.096663 -0.096663 -0.096663 -0.096663 -0.072499 -0.060415 -0.048332 -0.036249 -0.024166 -0.012083 0 0 0 0 projected
  arc A85 (-9.1729, 4.5699) -> (-9.3284, 4.2435) centre (0, 0) ccw projected
  spline S85 degree 3 poles (-9.1729, 4.5699) (-9.2034, 4.5963) (-9.2643, 4.649) (-9.3511, 4.7331) (-9.4351, 4.82) (-9.516, 4.9097) (-9.5942, 5.002) (-9.6951, 5.1276) (-9.7656, 5.2258) (-9.8126, 5.2912) knots -0.096663 -0.096663 -0.096663 -0.096663 -0.084581 -0.072498 -0.060415 -0.048331 -0.036248 -0.024165 0 0 0 0 projected
  arc A86 (-9.7124, 5.4729) -> (-9.8126, 5.2912) centre (0, 0) ccw projected
  spline S86 degree 3 poles (-9.7124, 5.4729) (-9.632, 5.4681) (-9.5113, 5.4609) (-9.3512, 5.4426) (-9.2316, 5.4258) (-9.1125, 5.4052) (-8.9941, 5.3806) (-8.8767, 5.3521) (-8.7996, 5.3287) (-8.761, 5.317) knots -0.096663 -0.096663 -0.096663 -0.096663 -0.072499 -0.060415 -0.048332 -0.036249 -0.024166 -0.012083 0 0 0 0 projected
  arc A87 (-8.568, 5.6228) -> (-8.761, 5.317) centre (0, 0) ccw projected
  spline S87 degree 3 poles (-8.568, 5.6228) (-8.5952, 5.6525) (-8.6494, 5.7121) (-8.7257, 5.8059) (-8.7988, 5.9021) (-8.8686, 6.0008) (-8.9352, 6.1016) (-9.0206, 6.2383) (-9.079, 6.3441) (-9.1179, 6.4146) knots -0.096663 -0.096663 -0.096663 -0.096663 -0.084581 -0.072498 -0.060415 -0.048331 -0.036248 -0.024165 0 0 0 0 projected
  arc A88 (-8.9969, 6.5832) -> (-9.1179, 6.4146) centre (0, 0) ccw projected
  spline S88 degree 3 poles (-8.9969, 6.5832) (-8.9176, 6.5689) (-8.7987, 6.5475) (-8.6419, 6.5104) (-8.525, 6.4796) (-8.4092, 6.4451) (-8.2946, 6.4066) (-8.1814, 6.3644) (-8.1076, 6.3321) (-8.0707, 6.3159) knots -0.096663 -0.096663 -0.096663 -0.096663 -0.072499 -0.060415 -0.048332 -0.036249 -0.024166 -0.012083 0 0 0 0 projected
  arc A89 (-7.8429, 6.5967) -> (-8.0707, 6.3159) centre (0, 0) ccw projected
  spline S89 degree 3 poles (-7.8429, 6.5967) (-7.8663, 6.6294) (-7.9131, 6.695) (-7.9778, 6.7971) (-8.039, 6.9013) (-8.0966, 7.0076) (-8.1509, 7.1155) (-8.2194, 7.2614) (-8.2649, 7.3734) (-8.2952, 7.448) knots -0.096663 -0.096663 -0.096663 -0.096663 -0.084581 -0.072498 -0.060415 -0.048331 -0.036248 -0.024165 0 0 0 0 projected
  arc A90 (-8.1552, 7.6011) -> (-8.2952, 7.448) centre (0, 0) ccw projected
  spline S90 degree 3 poles (-8.1552, 7.6011) (-8.0781, 7.5775) (-7.9625, 7.5422) (-7.8112, 7.4868) (-7.6988, 7.4424) (-7.5879, 7.3944) (-7.4787, 7.3427) (-7.3712, 7.2874) (-7.3017, 7.2465) (-7.267, 7.2261) knots -0.096663 -0.096663 -0.096663 -0.096663 -0.072499 -0.060415 -0.048332 -0.036249 -0.024166 -0.012083 0 0 0 0 projected
  arc A91 (-7.0076, 7.478) -> (-7.267, 7.2261) centre (0, 0) ccw projected
  spline S91 degree 3 poles (-7.0076, 7.478) (-7.027, 7.5133) (-7.0657, 7.5839) (-7.1179, 7.693) (-7.1663, 7.8037) (-7.2109, 7.916) (-7.2521, 8.0296) (-7.3029, 8.1825) (-7.3348, 8.2991) (-7.3561, 8.3768) knots -0.096663 -0.096663 -0.096663 -0.096663 -0.084581 -0.072498 -0.060415 -0.048331 -0.036248 -0.024165 0 0 0 0 projected
  arc A92 (-7.1989, 8.5123) -> (-7.3561, 8.3768) centre (0, 0) ccw projected
  spline S92 degree 3 poles (-7.1989, 8.5123) (-7.1252, 8.4798) (-7.0146, 8.431) (-6.8709, 8.3581) (-6.7646, 8.3007) (-6.6601, 8.24) (-6.5577, 8.1757) (-6.4576, 8.108) (-6.3934, 8.0593) (-6.3614, 8.0349) knots -0.096663 -0.096663 -0.096663 -0.096663 -0.072499 -0.060415 -0.048332 -0.036249 -0.024166 -0.012083 0 0 0 0 projected
  arc A93 (-6.074, 8.2543) -> (-6.3614, 8.0349) centre (0, 0) ccw projected
  spline S93 degree 3 poles (-6.074, 8.2543) (-6.089, 8.2916) (-6.1192, 8.3664) (-6.158, 8.4808) (-6.193, 8.5965) (-6.2241, 8.7133) (-6.2515, 8.831) (-6.2839, 8.9889) (-6.3018, 9.1084) (-6.3137, 9.1881) knots -0.096663 -0.096663 -0.096663 -0.096663 -0.084581 -0.072498 -0.060415 -0.048331 -0.036248 -0.024165 0 0 0 0 projected
  arc A94 (-6.1416, 9.304) -> (-6.3137, 9.1881) centre (0, 0) ccw projected
  spline S94 degree 3 poles (-6.1416, 9.304) (-6.0723, 9.263) (-5.9682, 9.2015) (-5.8341, 9.1121) (-5.7353, 9.0425) (-5.6388, 8.9698) (-5.5447, 8.8939) (-5.4533, 8.8149) (-5.3954, 8.7589) (-5.3664, 8.7309) knots -0.096663 -0.096663 -0.096663 -0.096663 -0.072499 -0.060415 -0.048332 -0.036249 -0.024166 -0.012083 0 0 0 0 projected
  arc A95 (-5.0551, 8.9147) -> (-5.3664, 8.7309) centre (0, 0) ccw projected
  spline S95 degree 3 poles (-5.0551, 8.9147) (-5.0656, 8.9536) (-5.0867, 9.0314) (-5.1117, 9.1496) (-5.1328, 9.2686) (-5.1498, 9.3883) (-5.1631, 9.5084) (-5.1766, 9.669) (-5.1803, 9.7898) (-5.1827, 9.8703) knots -0.096663 -0.096663 -0.096663 -0.096663 -0.084581 -0.072498 -0.060415 -0.048331 -0.036248 -0.024165 0 0 0 0 projected
  arc A96 (-4.9981, 9.9651) -> (-5.1827, 9.8703) centre (0, 0) ccw projected
  spline S96 degree 3 poles (-4.9981, 9.9651) (-4.9341, 9.9161) (-4.838, 9.8428) (-4.7154, 9.7382) (-4.6256, 9.6574) (-4.5383, 9.5738) (-4.4539, 9.4873) (-4.3724, 9.398) (-4.3215, 9.3355) (-4.2961, 9.3043) knots -0.096663 -0.096663 -0.096663 -0.096663 -0.072499 -0.060415 -0.048332 -0.036249 -0.024166 -0.012083 0 0 0 0 projected
  arc A97 (-3.9652, 9.45) -> (-4.2961, 9.3043) centre (0, 0) ccw projected
  spline S97 degree 3 poles (-3.9652, 9.45) (-3.9711, 9.4899) (-3.9828, 9.5696) (-3.9937, 9.69) (-4.0006, 9.8106) (-4.0033, 9.9315) (-4.0023, 10.0523) (-3.9967, 10.2134) (-3.986, 10.3337) (-3.9789, 10.414) knots -0.096663 -0.096663 -0.096663 -0.096663 -0.084581 -0.072498 -0.060415 -0.048331 -0.036248 -0.024165 0 0 0 0 projected
  arc A98 (-3.7844, 10.4863) -> (-3.9789, 10.414) centre (0, 0) ccw projected
  spline S98 degree 3 poles (-3.7844, 10.4863) (-3.7266, 10.4301) (-3.64, 10.3459) (-3.5306, 10.2275) (-3.4509, 10.1367) (-3.3741, 10.0433) (-3.3006, 9.9475) (-3.2302, 9.8492) (-3.1871, 9.7811) (-3.1655, 9.7471) knots -0.096663 -0.096663 -0.096663 -0.096663 -0.072499 -0.060415 -0.048332 -0.036249 -0.024166 -0.012083 0 0 0 0 projected
  arc A99 (-2.8197, 9.8527) -> (-3.1655, 9.7471) centre (0, 0) ccw projected
  spline S99 degree 3 poles (-2.8197, 9.8527) (-2.8208, 9.893) (-2.8231, 9.9735) (-2.8196, 10.0943) (-2.8122, 10.215) (-2.8006, 10.3353) (-2.7853, 10.4551) (-2.7607, 10.6144) (-2.7359, 10.7327) (-2.7193, 10.8115) knots -0.096663 -0.096663 -0.096663 -0.096663 -0.084581 -0.072498 -0.060415 -0.048331 -0.036248 -0.024165 0 0 0 0 projected
  arc A100 (-2.5176, 10.8602) -> (-2.7193, 10.8115) centre (0, 0) ccw projected
  spline S100 degree 3 poles (-2.5176, 10.8602) (-2.4669, 10.7977) (-2.3908, 10.7038) (-2.2962, 10.5733) (-2.2278, 10.4737) (-2.1626, 10.3719) (-2.1009, 10.268) (-2.0426, 10.1621) (-2.0079, 10.0894) (-1.9905, 10.0531) knots -0.096663 -0.096663 -0.096663 -0.096663 -0.072499 -0.060415 -0.048332 -0.036249 -0.024166 -0.012083 0 0 0 0 projected
  arc A101 (-1.6346, 10.117) -> (-1.9905, 10.0531) centre (0, 0) ccw projected
  spline S101 degree 3 poles (-1.6346, 10.117) (-1.631, 10.1572) (-1.6236, 10.2374) (-1.6059, 10.357) (-1.5843, 10.4759) (-1.5586, 10.5939) (-1.5292, 10.7112) (-1.4859, 10.8664) (-1.4473, 10.9809) (-1.4215, 11.0572) knots -0.096663 -0.096663 -0.096663 -0.096663 -0.084581 -0.072498 -0.060415 -0.048331 -0.036248 -0.024165 0 0 0 0 projected
  arc A102 (-1.2155, 11.0818) -> (-1.4215, 11.0572) centre (0, 0) ccw projected
  spline S102 degree 3 poles (-1.2155, 11.0818) (-1.1725, 11.0136) (-1.108, 10.9114) (-1.0295, 10.7707) (-0.9734, 10.6636) (-0.9207, 10.5549) (-0.8717, 10.4444) (-0.8264, 10.3323) (-0.8005, 10.2561) (-0.7875, 10.2179) knots -0.096663 -0.096663 -0.096663 -0.096663 -0.072499 -0.060415 -0.048332 -0.036249 -0.024166 -0.012083 0 0 0 0 projected
  arc A103 (-0.4266, 10.2394) -> (-0.7875, 10.2179) centre (0, 0) ccw projected
  spline S103 degree 3 poles (-0.4266, 10.2394) (-0.4182, 10.2788) (-0.4014, 10.3576) (-0.3697, 10.4742) (-0.3341, 10.5897) (-0.2946, 10.7039) (-0.2516, 10.8168) (-0.1903, 10.9659) (-0.1384, 11.075) (-0.1037, 11.1478) knots -0.096663 -0.096663 -0.096663 -0.096663 -0.084581 -0.072498 -0.060415 -0.048331 -0.036248 -0.024165 0 0 0 0 projected
  arc A104 (0.1037, 11.1478) -> (-0.1037, 11.1478) centre (0, 0) ccw projected
  spline S104 degree 3 poles (0.1037, 11.1478) (0.1384, 11.075) (0.1903, 10.9659) (0.2516, 10.8168) (0.2946, 10.7039) (0.3341, 10.5897) (0.3697, 10.4742) (0.4014, 10.3576) (0.4182, 10.2788) (0.4266, 10.2394) knots -0.096663 -0.096663 -0.096663 -0.096663 -0.072499 -0.060415 -0.048332 -0.036249 -0.024166 -0.012083 0 0 0 0 projected
  arc A105 (0.7875, 10.2179) -> (0.4266, 10.2394) centre (0, 0) ccw projected
  spline S105 degree 3 poles (0.7875, 10.2179) (0.8005, 10.2561) (0.8264, 10.3323) (0.8717, 10.4444) (0.9207, 10.5549) (0.9734, 10.6636) (1.0295, 10.7707) (1.108, 10.9114) (1.1725, 11.0136) (1.2155, 11.0818) knots -0.096663 -0.096663 -0.096663 -0.096663 -0.084581 -0.072498 -0.060415 -0.048331 -0.036248 -0.024165 0 0 0 0 projected
  arc A106 (1.4215, 11.0572) -> (1.2155, 11.0818) centre (0, 0) ccw projected
  circle A107 centre (0, 0) radius 12.0482 projected
  dimension "d0" = 1
extrude "Extrusion1" add sketch "Sketch1" against normal blind 2 contours A0
sketch "Sketch2" plane through (0, 0, 0) normal (0, 0, 1) x (1, 0, 0)
  circle A0 centre (0, 0) radius 13.0482 projected
  circle A1 centre (0, 0) radius 13.0482
extrude "Extrusion2" add sketch "Sketch2" along normal blind 2
sketch "Sketch3" plane through (0, 0, 2) normal (0, 0, 1) x (1, 0, 0)
  circle A0 centre (0, 0) radius 13.0482 projected
  circle A1 centre (0, 0) radius 1.05
  dimension "d5" = 2.1
extrude "Extrusion3" cut sketch "Sketch3" against normal through all contours A1
properties part number "inDeckel"
